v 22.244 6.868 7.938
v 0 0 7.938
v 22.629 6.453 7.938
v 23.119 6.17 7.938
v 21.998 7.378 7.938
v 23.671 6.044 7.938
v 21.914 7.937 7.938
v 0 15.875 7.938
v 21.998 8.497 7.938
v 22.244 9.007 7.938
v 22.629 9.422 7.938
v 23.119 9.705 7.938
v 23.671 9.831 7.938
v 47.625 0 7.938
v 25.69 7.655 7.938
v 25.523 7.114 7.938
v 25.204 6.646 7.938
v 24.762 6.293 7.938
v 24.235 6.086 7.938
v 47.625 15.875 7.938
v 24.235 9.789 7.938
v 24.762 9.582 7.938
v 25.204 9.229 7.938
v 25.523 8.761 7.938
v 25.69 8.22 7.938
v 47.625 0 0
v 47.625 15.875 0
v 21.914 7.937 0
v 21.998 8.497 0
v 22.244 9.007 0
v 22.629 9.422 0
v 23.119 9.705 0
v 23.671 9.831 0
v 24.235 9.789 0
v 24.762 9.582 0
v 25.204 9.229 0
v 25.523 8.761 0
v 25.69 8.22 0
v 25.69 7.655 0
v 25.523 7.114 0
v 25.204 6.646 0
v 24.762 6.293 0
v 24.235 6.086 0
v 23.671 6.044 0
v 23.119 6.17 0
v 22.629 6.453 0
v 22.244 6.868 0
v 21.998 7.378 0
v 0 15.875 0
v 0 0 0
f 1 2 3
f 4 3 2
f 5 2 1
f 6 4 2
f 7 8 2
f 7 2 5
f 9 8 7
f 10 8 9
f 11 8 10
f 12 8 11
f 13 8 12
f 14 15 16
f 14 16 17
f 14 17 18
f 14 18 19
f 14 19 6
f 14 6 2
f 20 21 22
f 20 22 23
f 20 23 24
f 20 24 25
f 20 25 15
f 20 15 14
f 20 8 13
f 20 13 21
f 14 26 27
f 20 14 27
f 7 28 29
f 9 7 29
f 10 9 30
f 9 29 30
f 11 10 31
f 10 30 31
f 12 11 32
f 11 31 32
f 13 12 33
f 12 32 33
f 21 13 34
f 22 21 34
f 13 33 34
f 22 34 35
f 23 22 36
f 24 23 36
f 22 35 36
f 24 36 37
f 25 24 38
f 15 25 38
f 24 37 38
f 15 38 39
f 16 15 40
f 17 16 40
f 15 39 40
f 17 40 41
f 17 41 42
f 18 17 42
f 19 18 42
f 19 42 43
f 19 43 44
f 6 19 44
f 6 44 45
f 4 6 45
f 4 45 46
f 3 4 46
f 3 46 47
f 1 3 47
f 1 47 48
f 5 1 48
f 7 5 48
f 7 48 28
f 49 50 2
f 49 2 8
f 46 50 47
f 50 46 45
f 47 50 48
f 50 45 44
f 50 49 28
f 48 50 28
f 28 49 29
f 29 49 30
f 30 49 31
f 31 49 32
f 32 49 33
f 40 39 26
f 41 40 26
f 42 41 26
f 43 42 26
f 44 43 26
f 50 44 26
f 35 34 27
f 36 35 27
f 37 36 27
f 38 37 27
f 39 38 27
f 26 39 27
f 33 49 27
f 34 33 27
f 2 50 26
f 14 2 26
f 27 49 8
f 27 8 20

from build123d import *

# Parameters (mm, degrees)
SKETCH1_W                 = 47.625
SKETCH1_H                 = 15.875
BOSS_EXTRUDE1_DEPTH       = 7.9375
F_6_CLEARANCE_HOLE1_D     = 3.7973
F_6_CLEARANCE_HOLE1_DEPTH = 7.9375


with BuildPart() as part:
    # Sketch1 → Boss-Extrude1 (new body)
    with BuildSketch(Plane.XY):
        with Locations((23.8125, 7.9375)):
            Rectangle(SKETCH1_W, SKETCH1_H)
    extrude(amount=BOSS_EXTRUDE1_DEPTH)

    # #6 Clearance Hole1
    with Locations(Plane.XY.offset(7.9375)):
        with Locations((23.8125, 7.9375)):
            Hole(F_6_CLEARANCE_HOLE1_D / 2, depth=F_6_CLEARANCE_HOLE1_DEPTH)


solid = part.part
